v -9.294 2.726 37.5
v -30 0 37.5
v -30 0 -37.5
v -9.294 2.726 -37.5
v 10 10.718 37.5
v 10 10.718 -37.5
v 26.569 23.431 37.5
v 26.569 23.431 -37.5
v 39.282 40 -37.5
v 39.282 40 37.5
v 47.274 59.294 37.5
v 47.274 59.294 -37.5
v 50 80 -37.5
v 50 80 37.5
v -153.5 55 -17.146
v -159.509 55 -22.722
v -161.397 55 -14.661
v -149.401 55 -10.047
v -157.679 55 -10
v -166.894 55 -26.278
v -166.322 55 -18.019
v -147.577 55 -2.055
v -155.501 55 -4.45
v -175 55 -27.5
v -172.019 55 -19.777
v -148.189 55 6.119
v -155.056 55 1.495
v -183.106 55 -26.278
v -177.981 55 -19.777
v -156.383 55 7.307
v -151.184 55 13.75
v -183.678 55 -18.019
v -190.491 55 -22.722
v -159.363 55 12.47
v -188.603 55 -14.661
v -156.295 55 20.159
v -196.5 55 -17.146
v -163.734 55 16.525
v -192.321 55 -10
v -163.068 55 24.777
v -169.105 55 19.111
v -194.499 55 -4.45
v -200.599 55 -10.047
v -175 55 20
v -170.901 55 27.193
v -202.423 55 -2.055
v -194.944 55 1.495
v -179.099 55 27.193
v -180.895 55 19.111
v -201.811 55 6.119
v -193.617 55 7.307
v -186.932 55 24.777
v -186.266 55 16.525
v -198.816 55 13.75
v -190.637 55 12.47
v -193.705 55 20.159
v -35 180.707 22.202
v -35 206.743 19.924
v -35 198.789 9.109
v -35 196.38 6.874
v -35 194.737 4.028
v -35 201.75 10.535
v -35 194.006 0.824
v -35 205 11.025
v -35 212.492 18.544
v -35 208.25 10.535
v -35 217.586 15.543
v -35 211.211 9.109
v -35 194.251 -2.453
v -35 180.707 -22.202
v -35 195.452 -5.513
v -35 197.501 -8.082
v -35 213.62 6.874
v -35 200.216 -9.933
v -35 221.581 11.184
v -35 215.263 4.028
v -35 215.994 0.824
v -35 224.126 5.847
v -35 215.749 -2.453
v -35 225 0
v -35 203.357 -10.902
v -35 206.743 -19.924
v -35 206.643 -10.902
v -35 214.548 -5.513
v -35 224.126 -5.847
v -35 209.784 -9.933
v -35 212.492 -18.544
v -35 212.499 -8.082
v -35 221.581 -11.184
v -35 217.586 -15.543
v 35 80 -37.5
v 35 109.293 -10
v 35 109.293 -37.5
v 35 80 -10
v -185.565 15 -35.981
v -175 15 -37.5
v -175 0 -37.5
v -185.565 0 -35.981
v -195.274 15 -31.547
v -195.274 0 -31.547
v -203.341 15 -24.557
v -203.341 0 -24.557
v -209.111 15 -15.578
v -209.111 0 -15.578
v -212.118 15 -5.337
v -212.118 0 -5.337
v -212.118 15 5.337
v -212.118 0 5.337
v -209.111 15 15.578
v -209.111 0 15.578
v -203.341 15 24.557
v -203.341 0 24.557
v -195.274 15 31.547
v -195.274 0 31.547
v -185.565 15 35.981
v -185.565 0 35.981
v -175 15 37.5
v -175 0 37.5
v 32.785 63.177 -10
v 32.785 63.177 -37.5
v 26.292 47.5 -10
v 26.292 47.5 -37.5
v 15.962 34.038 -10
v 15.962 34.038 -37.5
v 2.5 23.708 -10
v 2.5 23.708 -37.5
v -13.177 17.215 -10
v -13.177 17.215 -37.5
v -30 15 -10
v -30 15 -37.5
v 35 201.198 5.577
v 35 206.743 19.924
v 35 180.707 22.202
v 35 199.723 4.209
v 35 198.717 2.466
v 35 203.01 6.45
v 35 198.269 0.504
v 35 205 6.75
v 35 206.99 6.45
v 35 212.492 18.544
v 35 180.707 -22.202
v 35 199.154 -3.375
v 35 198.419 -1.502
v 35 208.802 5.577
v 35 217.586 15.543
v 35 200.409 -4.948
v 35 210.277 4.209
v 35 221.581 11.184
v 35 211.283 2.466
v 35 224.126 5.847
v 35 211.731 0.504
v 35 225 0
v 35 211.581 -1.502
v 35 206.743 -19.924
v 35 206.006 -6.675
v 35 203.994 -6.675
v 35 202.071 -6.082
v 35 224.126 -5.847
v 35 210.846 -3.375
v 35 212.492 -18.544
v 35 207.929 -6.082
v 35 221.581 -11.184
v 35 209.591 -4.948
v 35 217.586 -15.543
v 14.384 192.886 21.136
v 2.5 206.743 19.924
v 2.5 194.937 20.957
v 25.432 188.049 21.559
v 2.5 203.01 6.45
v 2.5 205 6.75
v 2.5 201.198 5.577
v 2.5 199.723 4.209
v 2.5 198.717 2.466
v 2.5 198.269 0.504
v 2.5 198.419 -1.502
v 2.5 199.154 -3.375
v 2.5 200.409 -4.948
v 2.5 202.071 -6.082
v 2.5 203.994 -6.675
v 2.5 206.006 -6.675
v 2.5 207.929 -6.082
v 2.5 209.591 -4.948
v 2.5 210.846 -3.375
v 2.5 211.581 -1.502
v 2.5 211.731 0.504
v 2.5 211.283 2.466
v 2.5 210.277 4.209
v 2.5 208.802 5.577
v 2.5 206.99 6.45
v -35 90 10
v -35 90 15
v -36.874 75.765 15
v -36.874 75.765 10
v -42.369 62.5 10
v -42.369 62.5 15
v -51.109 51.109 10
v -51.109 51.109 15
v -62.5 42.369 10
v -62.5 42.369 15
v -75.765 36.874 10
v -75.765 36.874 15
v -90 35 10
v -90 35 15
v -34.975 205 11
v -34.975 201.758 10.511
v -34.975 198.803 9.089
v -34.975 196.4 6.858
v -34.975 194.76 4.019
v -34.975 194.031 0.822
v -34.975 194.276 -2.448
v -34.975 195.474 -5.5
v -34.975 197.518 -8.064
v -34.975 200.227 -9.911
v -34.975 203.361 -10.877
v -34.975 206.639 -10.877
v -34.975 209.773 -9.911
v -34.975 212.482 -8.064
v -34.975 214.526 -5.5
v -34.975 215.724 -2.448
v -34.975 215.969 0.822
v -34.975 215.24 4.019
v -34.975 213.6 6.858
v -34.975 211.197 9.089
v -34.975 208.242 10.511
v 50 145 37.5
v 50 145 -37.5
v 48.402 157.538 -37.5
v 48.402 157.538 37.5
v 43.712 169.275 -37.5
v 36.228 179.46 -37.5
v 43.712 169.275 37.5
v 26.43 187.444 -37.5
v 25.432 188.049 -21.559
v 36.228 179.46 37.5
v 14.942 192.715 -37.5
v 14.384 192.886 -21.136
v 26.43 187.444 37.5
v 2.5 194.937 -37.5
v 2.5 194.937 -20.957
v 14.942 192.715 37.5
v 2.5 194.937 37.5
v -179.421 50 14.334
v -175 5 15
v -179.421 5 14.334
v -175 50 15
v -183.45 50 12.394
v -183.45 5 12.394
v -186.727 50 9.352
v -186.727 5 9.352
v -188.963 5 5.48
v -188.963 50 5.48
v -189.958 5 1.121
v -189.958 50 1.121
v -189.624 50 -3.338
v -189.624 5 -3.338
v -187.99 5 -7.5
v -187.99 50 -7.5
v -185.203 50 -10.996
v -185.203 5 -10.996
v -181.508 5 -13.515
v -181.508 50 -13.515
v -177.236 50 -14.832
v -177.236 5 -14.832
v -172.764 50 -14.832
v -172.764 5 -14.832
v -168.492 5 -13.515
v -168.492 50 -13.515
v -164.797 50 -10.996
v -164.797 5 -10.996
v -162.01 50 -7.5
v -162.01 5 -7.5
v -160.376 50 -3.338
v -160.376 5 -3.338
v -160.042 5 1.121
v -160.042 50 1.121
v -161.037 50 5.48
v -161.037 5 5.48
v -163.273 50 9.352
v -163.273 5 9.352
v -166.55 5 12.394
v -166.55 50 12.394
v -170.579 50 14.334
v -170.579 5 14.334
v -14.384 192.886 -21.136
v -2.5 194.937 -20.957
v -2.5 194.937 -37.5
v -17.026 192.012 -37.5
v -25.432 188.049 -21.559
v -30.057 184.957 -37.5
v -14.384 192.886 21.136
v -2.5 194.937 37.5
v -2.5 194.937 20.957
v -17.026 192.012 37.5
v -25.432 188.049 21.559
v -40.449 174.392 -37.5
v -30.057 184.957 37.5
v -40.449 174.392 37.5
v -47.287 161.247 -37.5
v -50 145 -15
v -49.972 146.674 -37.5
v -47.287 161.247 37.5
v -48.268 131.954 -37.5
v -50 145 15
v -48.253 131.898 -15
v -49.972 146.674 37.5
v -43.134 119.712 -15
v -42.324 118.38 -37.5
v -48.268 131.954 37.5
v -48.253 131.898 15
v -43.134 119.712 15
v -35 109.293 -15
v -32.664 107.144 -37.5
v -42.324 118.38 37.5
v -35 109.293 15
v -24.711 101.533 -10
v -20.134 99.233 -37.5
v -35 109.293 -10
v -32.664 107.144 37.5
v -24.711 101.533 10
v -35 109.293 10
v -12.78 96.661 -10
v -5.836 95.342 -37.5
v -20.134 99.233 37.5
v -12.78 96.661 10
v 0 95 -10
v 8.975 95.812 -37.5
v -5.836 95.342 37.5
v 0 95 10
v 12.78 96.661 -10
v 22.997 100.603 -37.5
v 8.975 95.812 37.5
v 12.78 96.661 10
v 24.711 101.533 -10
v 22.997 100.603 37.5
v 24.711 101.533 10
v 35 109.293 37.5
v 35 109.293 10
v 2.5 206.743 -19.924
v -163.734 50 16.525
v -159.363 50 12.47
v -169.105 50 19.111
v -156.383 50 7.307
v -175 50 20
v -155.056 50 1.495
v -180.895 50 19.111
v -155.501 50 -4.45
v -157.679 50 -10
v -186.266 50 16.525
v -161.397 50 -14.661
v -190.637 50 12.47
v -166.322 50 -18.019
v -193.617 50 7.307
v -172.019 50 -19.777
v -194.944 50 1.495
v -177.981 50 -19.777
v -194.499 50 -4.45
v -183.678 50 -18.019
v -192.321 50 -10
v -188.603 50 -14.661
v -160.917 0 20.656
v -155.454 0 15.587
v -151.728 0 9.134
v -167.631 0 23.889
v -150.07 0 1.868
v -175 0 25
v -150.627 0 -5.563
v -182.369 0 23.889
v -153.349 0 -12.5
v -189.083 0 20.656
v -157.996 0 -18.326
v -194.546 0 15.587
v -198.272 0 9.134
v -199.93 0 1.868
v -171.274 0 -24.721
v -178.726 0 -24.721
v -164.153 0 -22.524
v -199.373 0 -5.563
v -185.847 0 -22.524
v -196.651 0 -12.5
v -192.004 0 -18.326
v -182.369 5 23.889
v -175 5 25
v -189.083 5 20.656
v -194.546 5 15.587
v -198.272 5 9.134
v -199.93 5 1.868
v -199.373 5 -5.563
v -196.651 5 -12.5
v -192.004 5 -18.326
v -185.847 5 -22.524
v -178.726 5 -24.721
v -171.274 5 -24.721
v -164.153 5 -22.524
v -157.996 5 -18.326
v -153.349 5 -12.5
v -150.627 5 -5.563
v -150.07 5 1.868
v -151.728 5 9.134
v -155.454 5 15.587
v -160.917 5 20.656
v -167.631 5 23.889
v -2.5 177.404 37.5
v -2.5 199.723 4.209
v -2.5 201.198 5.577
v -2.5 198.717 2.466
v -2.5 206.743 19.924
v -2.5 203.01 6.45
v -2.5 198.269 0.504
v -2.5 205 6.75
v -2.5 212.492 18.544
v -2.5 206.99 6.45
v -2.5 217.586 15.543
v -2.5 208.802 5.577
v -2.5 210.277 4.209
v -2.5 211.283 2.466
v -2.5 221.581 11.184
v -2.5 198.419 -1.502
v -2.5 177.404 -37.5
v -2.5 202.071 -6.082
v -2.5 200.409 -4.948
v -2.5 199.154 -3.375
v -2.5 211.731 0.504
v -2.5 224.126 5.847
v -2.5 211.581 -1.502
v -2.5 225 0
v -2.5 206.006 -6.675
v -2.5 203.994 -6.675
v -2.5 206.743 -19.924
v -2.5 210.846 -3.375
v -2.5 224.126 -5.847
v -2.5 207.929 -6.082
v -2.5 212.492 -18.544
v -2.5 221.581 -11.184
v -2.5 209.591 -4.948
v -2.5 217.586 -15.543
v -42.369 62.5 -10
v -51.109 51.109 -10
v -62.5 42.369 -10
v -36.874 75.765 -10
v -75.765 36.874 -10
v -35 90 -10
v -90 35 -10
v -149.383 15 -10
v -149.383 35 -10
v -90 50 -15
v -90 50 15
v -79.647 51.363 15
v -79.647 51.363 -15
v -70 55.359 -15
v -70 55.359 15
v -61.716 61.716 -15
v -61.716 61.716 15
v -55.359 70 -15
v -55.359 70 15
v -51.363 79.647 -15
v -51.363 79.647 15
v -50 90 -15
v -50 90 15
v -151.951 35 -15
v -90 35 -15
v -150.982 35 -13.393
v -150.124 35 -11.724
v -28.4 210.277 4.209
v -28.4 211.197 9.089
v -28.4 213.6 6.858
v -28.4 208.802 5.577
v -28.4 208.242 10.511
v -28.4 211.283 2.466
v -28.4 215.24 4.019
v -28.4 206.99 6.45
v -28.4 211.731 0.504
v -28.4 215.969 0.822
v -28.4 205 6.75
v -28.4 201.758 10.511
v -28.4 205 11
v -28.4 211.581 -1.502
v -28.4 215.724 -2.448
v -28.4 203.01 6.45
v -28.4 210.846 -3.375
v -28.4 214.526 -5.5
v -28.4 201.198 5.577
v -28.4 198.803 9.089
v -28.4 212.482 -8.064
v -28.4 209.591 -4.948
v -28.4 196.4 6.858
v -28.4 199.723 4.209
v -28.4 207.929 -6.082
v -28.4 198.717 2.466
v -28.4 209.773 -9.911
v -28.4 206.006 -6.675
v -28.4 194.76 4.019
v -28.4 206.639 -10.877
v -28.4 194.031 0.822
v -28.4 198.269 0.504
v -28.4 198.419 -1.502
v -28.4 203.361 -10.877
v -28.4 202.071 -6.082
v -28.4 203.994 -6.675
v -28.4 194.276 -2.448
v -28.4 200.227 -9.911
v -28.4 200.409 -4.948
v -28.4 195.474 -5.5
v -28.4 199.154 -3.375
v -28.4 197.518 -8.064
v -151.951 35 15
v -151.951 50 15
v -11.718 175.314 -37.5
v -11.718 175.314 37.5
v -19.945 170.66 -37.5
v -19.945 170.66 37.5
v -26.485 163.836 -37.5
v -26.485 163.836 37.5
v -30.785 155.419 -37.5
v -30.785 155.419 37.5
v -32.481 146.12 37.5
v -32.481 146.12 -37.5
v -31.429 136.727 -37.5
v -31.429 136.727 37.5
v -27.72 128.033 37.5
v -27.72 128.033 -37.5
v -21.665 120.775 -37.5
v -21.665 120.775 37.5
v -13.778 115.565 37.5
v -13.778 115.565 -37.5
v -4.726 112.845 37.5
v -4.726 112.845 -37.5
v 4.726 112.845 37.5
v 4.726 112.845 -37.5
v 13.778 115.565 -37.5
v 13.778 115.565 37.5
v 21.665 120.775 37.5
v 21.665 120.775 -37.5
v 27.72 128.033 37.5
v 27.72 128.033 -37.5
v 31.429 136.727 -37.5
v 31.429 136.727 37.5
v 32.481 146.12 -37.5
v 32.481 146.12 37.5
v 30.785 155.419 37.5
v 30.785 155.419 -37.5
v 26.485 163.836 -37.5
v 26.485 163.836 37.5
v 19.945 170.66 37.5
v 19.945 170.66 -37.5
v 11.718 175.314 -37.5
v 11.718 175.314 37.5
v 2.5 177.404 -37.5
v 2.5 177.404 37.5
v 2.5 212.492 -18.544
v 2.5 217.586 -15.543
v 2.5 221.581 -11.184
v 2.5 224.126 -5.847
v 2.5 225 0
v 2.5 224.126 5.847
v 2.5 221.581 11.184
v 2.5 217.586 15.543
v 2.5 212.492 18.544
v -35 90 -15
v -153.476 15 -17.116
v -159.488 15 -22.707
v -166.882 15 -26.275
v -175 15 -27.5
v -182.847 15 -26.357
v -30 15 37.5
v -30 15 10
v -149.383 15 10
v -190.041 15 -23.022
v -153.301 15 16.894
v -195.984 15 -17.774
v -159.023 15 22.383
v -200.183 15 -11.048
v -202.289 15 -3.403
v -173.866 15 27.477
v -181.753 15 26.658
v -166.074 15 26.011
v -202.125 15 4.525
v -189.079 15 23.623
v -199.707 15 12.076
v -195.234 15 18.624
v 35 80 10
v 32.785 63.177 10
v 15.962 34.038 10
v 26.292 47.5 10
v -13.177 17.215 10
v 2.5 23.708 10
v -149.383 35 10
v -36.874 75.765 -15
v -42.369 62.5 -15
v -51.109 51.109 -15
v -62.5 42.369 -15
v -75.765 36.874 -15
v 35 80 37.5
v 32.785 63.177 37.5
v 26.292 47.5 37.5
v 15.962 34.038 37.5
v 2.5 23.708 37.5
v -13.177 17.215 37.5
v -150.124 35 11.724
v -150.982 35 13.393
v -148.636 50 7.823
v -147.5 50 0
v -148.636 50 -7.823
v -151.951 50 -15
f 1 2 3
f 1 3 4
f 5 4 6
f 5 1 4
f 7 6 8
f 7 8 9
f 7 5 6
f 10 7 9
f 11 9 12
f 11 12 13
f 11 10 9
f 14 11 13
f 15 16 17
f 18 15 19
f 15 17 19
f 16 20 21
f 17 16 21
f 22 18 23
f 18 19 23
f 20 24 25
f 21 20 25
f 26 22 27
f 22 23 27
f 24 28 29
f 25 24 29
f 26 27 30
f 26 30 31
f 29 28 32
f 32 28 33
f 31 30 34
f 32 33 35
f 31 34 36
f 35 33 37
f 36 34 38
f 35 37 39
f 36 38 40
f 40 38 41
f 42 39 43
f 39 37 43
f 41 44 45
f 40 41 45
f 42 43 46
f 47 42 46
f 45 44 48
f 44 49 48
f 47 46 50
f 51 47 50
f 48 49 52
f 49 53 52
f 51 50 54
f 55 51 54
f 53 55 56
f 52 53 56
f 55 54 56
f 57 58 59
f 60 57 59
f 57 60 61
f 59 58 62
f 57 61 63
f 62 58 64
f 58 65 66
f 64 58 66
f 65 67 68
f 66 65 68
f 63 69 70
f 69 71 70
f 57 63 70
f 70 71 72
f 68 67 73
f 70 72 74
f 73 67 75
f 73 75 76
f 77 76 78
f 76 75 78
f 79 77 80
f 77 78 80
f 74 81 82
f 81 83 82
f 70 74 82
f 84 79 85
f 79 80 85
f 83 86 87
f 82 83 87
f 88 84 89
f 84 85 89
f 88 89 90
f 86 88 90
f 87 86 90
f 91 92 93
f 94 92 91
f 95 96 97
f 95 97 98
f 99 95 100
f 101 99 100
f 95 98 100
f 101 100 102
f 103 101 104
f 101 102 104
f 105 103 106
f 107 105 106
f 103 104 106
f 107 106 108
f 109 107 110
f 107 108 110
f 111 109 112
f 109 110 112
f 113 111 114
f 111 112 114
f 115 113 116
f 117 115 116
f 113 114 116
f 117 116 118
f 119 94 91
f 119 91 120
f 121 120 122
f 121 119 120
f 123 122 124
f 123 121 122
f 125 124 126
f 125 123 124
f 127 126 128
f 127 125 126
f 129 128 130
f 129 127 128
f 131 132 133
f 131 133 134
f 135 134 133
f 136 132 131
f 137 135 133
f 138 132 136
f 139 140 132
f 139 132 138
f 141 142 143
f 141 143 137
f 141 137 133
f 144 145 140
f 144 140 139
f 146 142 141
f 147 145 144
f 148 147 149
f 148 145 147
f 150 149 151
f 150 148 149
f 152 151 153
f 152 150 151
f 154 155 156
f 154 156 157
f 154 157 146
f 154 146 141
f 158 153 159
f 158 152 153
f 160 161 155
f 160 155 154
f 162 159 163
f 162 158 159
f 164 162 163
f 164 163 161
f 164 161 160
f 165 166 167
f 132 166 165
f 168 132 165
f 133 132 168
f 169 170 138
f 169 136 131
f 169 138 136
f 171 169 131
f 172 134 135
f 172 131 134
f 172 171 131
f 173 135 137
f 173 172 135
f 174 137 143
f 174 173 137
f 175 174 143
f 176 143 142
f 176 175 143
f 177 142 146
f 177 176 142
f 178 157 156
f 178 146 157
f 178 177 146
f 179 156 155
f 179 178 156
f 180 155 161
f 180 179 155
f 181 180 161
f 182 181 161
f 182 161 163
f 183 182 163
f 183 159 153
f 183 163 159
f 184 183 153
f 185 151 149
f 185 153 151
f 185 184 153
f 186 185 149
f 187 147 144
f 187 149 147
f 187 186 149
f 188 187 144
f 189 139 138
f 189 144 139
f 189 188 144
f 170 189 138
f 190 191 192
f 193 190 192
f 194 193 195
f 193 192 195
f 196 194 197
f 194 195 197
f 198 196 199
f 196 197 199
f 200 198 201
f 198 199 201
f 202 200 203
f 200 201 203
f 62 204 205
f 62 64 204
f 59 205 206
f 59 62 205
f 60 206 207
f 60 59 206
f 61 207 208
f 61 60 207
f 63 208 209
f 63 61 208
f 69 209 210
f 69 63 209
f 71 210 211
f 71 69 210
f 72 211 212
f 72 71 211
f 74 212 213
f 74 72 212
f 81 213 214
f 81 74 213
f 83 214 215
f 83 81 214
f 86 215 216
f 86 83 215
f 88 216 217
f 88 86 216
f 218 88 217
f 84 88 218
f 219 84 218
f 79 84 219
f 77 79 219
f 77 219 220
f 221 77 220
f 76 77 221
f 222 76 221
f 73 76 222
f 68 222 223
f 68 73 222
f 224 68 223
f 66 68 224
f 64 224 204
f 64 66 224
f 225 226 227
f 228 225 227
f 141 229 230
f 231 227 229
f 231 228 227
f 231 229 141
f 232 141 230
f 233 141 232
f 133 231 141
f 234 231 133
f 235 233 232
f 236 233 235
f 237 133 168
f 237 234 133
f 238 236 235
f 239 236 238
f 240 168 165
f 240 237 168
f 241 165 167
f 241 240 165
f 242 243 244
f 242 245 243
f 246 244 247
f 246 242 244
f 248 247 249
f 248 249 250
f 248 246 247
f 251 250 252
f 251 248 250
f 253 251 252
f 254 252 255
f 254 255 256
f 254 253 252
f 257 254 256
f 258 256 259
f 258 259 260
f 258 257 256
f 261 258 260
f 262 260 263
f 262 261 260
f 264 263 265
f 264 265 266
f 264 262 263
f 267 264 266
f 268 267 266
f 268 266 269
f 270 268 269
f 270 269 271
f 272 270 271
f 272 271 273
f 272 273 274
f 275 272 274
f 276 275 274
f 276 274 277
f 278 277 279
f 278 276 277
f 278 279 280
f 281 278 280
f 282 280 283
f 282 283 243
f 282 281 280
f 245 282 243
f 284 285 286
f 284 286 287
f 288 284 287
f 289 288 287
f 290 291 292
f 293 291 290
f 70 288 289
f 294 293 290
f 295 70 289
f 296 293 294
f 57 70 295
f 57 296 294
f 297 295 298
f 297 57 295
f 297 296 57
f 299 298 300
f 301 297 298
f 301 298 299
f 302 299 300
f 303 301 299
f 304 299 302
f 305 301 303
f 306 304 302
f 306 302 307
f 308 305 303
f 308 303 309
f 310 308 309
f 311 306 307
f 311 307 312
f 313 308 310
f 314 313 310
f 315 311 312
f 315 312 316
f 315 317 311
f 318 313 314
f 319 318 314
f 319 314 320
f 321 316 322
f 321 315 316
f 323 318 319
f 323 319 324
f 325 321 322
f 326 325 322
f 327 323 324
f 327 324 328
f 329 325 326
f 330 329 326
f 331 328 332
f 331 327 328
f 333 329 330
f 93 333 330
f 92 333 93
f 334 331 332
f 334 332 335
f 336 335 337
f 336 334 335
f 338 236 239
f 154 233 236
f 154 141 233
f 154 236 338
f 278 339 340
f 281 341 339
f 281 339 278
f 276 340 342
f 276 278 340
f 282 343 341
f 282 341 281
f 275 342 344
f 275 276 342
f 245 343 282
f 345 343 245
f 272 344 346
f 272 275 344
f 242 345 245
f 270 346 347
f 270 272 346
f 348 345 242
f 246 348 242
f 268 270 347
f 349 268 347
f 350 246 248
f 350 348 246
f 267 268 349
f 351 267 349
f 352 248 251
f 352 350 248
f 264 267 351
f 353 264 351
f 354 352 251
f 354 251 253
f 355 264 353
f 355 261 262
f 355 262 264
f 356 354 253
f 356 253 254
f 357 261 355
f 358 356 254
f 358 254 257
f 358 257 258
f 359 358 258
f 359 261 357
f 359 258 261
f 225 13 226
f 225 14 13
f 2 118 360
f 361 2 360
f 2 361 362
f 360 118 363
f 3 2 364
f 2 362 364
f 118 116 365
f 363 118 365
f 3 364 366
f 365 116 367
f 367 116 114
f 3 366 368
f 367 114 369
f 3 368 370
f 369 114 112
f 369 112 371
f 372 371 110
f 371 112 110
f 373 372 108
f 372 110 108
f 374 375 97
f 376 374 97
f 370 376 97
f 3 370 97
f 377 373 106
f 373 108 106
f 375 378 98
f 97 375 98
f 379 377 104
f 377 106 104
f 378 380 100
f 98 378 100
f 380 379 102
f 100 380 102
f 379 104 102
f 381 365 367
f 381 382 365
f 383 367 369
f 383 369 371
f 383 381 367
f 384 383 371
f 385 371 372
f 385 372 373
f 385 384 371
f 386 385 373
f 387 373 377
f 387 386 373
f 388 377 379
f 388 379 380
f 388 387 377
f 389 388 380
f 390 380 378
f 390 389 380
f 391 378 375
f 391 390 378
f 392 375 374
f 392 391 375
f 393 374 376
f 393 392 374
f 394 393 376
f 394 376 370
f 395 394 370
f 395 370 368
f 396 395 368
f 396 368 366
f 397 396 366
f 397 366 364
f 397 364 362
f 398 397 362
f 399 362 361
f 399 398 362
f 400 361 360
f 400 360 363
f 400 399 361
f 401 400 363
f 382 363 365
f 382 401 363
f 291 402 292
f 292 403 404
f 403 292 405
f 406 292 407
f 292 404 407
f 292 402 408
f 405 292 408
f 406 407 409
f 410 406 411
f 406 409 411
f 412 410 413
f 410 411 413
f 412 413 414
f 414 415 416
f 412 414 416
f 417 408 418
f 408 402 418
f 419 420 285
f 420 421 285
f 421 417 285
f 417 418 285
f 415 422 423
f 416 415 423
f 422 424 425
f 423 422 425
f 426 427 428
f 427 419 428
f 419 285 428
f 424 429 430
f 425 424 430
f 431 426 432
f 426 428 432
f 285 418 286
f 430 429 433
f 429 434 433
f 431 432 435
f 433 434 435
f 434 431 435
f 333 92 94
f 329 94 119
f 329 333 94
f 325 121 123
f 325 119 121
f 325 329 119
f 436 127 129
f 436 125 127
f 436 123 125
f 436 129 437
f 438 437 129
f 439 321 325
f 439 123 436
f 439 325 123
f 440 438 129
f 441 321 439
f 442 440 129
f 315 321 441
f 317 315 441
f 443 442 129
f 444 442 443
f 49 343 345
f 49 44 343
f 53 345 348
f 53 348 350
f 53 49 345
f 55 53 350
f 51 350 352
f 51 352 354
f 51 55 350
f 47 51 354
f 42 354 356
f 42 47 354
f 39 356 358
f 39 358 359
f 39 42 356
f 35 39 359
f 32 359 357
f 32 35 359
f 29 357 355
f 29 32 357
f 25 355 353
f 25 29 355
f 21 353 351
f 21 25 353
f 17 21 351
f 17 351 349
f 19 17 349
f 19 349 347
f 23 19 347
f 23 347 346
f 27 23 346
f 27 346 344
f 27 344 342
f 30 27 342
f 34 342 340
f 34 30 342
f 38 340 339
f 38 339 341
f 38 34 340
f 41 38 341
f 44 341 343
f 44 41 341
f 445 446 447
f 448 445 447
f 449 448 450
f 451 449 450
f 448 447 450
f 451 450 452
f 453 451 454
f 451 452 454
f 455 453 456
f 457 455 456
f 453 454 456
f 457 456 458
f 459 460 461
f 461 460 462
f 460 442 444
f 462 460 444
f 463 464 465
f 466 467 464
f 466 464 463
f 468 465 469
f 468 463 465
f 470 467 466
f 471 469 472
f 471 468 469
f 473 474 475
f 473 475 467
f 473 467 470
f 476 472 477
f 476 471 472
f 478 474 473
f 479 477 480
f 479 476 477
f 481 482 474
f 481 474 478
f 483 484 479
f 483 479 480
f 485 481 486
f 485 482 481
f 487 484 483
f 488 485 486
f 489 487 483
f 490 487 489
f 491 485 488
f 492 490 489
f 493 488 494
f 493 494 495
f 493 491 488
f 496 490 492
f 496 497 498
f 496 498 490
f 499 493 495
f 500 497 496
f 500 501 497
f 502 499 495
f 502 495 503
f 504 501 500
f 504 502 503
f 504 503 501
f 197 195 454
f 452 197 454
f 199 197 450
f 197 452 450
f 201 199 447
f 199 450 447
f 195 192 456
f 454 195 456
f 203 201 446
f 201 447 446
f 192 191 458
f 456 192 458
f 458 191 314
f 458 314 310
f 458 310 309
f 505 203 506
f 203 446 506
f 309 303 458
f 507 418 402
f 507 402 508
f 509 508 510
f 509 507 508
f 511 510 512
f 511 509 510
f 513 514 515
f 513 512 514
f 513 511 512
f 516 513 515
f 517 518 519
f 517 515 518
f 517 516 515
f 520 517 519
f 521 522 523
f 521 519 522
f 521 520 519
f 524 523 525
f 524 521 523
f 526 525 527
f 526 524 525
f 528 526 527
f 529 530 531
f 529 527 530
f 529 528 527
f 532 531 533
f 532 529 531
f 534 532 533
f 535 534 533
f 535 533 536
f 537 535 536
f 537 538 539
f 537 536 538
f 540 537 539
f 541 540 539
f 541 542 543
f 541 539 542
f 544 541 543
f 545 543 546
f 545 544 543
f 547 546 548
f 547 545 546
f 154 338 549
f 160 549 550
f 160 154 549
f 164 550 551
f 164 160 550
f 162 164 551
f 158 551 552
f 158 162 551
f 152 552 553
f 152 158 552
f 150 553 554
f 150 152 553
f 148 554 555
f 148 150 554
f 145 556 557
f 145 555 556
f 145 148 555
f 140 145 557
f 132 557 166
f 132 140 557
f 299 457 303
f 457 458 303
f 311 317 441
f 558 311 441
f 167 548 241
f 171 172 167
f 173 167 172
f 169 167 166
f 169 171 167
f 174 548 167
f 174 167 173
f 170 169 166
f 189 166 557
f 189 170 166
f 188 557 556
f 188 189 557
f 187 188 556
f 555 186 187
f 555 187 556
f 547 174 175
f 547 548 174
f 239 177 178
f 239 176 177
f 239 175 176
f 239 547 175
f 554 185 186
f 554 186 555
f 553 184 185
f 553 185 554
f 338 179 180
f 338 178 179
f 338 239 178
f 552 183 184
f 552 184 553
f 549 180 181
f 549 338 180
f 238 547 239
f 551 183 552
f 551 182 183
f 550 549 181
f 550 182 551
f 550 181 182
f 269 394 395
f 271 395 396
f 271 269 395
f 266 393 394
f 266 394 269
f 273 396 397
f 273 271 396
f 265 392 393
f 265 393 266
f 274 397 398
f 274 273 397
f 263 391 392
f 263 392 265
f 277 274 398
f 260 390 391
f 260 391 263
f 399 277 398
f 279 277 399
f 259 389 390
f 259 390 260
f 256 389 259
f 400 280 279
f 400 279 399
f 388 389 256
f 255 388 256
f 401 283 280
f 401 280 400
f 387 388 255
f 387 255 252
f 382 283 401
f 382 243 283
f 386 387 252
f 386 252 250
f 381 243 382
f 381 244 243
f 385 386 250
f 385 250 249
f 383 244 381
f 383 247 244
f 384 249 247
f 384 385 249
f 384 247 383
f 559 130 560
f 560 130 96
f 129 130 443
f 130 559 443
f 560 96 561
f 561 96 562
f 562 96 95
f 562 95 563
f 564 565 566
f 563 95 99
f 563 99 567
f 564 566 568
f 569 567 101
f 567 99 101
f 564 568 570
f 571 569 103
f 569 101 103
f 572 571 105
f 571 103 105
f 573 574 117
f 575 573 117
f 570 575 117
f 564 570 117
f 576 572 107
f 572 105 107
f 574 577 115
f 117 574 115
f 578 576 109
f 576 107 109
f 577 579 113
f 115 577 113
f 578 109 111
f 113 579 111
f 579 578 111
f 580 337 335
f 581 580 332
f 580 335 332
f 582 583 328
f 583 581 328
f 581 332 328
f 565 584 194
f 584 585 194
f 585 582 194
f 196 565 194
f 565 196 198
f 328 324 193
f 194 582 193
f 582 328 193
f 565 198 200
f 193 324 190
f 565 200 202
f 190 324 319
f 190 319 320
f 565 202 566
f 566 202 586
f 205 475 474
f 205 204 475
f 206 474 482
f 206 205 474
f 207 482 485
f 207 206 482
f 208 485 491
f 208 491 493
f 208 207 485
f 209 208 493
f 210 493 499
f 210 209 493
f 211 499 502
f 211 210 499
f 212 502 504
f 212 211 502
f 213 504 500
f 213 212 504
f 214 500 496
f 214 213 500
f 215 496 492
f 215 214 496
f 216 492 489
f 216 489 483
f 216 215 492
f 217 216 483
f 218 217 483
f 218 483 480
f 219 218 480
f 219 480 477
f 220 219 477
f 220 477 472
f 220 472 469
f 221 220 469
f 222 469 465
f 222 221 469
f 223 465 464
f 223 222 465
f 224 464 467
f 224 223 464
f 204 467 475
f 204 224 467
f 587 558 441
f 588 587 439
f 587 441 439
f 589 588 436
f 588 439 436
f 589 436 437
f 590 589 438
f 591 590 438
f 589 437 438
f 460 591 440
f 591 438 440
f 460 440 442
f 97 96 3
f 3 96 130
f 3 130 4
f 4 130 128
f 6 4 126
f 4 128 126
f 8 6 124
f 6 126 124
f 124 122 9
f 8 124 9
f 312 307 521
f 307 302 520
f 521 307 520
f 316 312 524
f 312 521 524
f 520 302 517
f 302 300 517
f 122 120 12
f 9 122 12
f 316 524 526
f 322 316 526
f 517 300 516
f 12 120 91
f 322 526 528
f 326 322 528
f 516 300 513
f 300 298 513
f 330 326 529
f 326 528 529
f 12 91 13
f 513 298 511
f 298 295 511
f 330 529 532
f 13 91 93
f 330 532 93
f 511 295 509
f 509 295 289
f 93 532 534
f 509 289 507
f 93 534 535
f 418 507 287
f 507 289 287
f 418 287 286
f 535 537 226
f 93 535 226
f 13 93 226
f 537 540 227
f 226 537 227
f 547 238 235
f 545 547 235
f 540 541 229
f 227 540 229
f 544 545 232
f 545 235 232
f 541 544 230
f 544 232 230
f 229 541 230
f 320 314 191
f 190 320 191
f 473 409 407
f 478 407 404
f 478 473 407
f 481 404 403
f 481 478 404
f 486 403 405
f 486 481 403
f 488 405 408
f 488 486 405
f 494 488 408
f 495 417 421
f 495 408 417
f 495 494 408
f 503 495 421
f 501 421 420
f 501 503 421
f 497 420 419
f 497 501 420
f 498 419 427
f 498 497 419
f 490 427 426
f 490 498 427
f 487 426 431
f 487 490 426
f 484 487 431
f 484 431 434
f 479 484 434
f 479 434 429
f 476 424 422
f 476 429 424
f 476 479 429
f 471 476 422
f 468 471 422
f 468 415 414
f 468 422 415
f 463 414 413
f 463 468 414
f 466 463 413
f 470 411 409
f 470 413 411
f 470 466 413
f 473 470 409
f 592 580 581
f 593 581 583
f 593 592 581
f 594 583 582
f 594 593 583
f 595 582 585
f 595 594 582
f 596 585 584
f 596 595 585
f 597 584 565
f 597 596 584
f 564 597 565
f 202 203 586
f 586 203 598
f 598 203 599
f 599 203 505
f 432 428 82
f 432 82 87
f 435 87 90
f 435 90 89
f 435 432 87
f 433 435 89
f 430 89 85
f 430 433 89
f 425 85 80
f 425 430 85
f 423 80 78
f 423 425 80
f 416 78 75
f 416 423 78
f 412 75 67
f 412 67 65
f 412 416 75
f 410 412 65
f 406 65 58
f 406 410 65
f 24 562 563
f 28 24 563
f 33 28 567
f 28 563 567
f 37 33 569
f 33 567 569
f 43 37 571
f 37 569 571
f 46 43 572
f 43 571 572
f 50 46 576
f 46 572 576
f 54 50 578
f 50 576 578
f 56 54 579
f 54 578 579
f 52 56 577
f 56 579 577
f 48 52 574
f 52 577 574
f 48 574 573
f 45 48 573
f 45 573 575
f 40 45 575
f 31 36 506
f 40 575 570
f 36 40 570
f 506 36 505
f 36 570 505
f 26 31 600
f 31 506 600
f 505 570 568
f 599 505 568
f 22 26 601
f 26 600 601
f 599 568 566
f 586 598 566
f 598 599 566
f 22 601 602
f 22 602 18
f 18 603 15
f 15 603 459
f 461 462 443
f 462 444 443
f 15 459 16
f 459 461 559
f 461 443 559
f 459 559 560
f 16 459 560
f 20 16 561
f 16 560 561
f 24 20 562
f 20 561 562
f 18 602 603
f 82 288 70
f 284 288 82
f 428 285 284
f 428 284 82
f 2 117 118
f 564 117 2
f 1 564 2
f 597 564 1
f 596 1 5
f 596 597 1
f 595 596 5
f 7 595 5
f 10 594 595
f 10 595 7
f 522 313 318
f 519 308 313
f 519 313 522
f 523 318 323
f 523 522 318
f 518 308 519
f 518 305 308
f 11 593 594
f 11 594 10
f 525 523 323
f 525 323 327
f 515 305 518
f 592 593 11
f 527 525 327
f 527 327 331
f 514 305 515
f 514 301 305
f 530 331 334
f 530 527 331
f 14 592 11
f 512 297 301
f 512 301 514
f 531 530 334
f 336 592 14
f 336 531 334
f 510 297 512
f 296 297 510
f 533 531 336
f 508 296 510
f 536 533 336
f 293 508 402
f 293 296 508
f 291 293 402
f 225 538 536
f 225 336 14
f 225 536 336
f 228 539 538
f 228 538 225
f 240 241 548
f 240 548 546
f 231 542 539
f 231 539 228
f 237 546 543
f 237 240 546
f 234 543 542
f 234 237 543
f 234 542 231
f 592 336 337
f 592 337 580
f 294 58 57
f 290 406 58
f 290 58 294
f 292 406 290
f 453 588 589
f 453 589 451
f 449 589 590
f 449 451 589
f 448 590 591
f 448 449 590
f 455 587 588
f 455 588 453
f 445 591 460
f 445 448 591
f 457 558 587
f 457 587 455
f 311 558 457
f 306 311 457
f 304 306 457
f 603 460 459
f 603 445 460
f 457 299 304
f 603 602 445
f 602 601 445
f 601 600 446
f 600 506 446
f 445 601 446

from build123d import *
from build123d.topology import SkipClean

# Parameters (mm, degrees)
BOSS_EXTRUDE1_DEPTH     = 10
SKETCH1_3_R             = 50
BOSS_EXTRUDE2_DEPTH     = 37.5
BOSS_EXTRUDE3_DEPTH     = 15
BOSS_EXTRUDE4_DEPTH     = 37.5
BOSS_EXTRUDE5_DEPTH     = 35
CUT_EXTRUDE1_DEPTH      = 312.749097833
CUT_EXTRUDE1_DEPTH_BACK = 312.749097833
SKETCH12_R              = 32.5
SKETCH12_W              = 5
SKETCH12_H              = 95


with BuildPart() as part:
    # Sketch1 → Boss-Extrude1 (new, symmetric)
    with BuildSketch(Plane.XY):
        with BuildLine():
            Line((50, 145), (50, 80))
            ThreePointArc((50, 80), (26.568542495, 23.431457505), (-30, 0))
            Line((-30, 0), (-175, 0))
            Line((-175, 0), (-175, 50))
            Line((-175, 50), (-90, 50))
            ThreePointArc((-90, 50), (-61.715728753, 61.715728753), (-50, 90))
            Line((-50, 90), (-50, 145))
            Line((-50, 145), (50, 145))
        make_face()
    extrude(amount=BOSS_EXTRUDE1_DEPTH, both=True)

    # Sketch1<3> → Boss-Extrude2 (add, symmetric)
    with BuildSketch(Plane.XY):
        with Locations((0, 145)):
            Circle(SKETCH1_3_R)
    extrude(amount=BOSS_EXTRUDE2_DEPTH, both=True)

    # Sketch2 → Boss-Extrude3 (add, symmetric)
    with SkipClean():  # the faces are left unmerged after this step: merging them gives an invalid solid
        with BuildSketch(Plane.XY):
            with BuildLine():
                ThreePointArc((-90, 35), (-51.109127035, 51.109127035), (-35, 90))
                Line((-35, 90), (-35, 145))
                Line((-35, 145), (-50, 145))
                Line((-50, 145), (-50, 90))
                ThreePointArc((-50, 90), (-61.715728753, 61.715728753), (-90, 50))
                Line((-90, 50), (-175, 50))
                Line((-175, 50), (-175, 35))
                Line((-175, 35), (-90, 35))
            make_face()
        extrude(amount=BOSS_EXTRUDE3_DEPTH, both=True)
    add(part.part.scale(1), mode=Mode.REPLACE)  # the faces are merged on a copy

    # Sketch2<3> → Boss-Extrude4 (add, symmetric)
    with SkipClean():  # the faces are left unmerged after this step: merging them gives an invalid solid
        with BuildSketch(Plane.XY):
            with BuildLine():
                Line((-30, 15), (-175, 15))
                Line((-175, 15), (-175, 0))
                Line((-175, 0), (-30, 0))
                ThreePointArc((-30, 0), (26.568542495, 23.431457505), (50, 80))
                Line((50, 80), (50, 145))
                Line((50, 145), (35, 145))
                Line((35, 145), (35, 80))
                ThreePointArc((35, 80), (15.961940777, 34.038059223), (-30, 15))
            make_face()
        extrude(amount=BOSS_EXTRUDE4_DEPTH, both=True)
    add(part.part.scale(1), mode=Mode.REPLACE)  # the faces are merged on a copy

    # Sketch4 → Revolve1 (revolve)
    with BuildSketch(Plane.XY):
        Polygon((-175, 55), (-202.5, 55), (-202.5, 15), (-212.5, 15), (-212.5, 0), (-175, 0), align=None)
    revolve(axis=Axis((-175, 0, 0), (0, 1, 0)))

    # Sketch6 → Boss-Extrude5 (add, symmetric)
    with BuildSketch(Plane(origin=(0, 0, 0), x_dir=(0, 0, -1), z_dir=(1, 0, 0))):
        with BuildLine():
            Line((-25.325716562, 145), (25.325716562, 145))
            Line((25.325716562, 145), (19.923893962, 206.743114855))
            ThreePointArc((19.923893962, 206.743114855), (0, 225), (-19.923893962, 206.743114855))
            Line((-19.923893962, 206.743114855), (-25.325716562, 145))
        make_face()
    extrude(amount=BOSS_EXTRUDE5_DEPTH, both=True)

    # Sketch11 → CBORE for M12 SBHCS1 (revolve, cut)
    with BuildSketch(Plane(origin=(-35, 205, 0), x_dir=(0, 0, 1), z_dir=(0, 1, 0))):
        Polygon((0, 0), (0, 85), (6.75, 85), (6.75, 6.6), (11, 6.6), (11, 0.025), (11.025, 0), align=None)
    revolve(axis=Axis((-41.35, 205, 0), (1, 0, 0)), mode=Mode.SUBTRACT)

    # Sketch12 → Cut-Extrude1 (cut, two sides: drawn at the far end of the back side and taken through both)
    with BuildSketch(Plane.XY.offset(-CUT_EXTRUDE1_DEPTH_BACK)):
        with Locations((0, 145)):
            Circle(SKETCH12_R)
        with Locations((0, 177.5)):
            Rectangle(SKETCH12_W, SKETCH12_H)
    extrude(amount=CUT_EXTRUDE1_DEPTH + CUT_EXTRUDE1_DEPTH_BACK, mode=Mode.SUBTRACT)

    # Sketch13 → Cut-Revolve1 (revolve, cut)
    with BuildSketch(Plane.XY):
        Polygon((-175, 0), (-200, 0), (-200, 5), (-190, 5), (-190, 50), (-195, 50), (-195, 55), (-175, 55), align=None)
    revolve(axis=Axis((-175, 55, 0), (0, -1, 0)), mode=Mode.SUBTRACT)


solid = part.part
